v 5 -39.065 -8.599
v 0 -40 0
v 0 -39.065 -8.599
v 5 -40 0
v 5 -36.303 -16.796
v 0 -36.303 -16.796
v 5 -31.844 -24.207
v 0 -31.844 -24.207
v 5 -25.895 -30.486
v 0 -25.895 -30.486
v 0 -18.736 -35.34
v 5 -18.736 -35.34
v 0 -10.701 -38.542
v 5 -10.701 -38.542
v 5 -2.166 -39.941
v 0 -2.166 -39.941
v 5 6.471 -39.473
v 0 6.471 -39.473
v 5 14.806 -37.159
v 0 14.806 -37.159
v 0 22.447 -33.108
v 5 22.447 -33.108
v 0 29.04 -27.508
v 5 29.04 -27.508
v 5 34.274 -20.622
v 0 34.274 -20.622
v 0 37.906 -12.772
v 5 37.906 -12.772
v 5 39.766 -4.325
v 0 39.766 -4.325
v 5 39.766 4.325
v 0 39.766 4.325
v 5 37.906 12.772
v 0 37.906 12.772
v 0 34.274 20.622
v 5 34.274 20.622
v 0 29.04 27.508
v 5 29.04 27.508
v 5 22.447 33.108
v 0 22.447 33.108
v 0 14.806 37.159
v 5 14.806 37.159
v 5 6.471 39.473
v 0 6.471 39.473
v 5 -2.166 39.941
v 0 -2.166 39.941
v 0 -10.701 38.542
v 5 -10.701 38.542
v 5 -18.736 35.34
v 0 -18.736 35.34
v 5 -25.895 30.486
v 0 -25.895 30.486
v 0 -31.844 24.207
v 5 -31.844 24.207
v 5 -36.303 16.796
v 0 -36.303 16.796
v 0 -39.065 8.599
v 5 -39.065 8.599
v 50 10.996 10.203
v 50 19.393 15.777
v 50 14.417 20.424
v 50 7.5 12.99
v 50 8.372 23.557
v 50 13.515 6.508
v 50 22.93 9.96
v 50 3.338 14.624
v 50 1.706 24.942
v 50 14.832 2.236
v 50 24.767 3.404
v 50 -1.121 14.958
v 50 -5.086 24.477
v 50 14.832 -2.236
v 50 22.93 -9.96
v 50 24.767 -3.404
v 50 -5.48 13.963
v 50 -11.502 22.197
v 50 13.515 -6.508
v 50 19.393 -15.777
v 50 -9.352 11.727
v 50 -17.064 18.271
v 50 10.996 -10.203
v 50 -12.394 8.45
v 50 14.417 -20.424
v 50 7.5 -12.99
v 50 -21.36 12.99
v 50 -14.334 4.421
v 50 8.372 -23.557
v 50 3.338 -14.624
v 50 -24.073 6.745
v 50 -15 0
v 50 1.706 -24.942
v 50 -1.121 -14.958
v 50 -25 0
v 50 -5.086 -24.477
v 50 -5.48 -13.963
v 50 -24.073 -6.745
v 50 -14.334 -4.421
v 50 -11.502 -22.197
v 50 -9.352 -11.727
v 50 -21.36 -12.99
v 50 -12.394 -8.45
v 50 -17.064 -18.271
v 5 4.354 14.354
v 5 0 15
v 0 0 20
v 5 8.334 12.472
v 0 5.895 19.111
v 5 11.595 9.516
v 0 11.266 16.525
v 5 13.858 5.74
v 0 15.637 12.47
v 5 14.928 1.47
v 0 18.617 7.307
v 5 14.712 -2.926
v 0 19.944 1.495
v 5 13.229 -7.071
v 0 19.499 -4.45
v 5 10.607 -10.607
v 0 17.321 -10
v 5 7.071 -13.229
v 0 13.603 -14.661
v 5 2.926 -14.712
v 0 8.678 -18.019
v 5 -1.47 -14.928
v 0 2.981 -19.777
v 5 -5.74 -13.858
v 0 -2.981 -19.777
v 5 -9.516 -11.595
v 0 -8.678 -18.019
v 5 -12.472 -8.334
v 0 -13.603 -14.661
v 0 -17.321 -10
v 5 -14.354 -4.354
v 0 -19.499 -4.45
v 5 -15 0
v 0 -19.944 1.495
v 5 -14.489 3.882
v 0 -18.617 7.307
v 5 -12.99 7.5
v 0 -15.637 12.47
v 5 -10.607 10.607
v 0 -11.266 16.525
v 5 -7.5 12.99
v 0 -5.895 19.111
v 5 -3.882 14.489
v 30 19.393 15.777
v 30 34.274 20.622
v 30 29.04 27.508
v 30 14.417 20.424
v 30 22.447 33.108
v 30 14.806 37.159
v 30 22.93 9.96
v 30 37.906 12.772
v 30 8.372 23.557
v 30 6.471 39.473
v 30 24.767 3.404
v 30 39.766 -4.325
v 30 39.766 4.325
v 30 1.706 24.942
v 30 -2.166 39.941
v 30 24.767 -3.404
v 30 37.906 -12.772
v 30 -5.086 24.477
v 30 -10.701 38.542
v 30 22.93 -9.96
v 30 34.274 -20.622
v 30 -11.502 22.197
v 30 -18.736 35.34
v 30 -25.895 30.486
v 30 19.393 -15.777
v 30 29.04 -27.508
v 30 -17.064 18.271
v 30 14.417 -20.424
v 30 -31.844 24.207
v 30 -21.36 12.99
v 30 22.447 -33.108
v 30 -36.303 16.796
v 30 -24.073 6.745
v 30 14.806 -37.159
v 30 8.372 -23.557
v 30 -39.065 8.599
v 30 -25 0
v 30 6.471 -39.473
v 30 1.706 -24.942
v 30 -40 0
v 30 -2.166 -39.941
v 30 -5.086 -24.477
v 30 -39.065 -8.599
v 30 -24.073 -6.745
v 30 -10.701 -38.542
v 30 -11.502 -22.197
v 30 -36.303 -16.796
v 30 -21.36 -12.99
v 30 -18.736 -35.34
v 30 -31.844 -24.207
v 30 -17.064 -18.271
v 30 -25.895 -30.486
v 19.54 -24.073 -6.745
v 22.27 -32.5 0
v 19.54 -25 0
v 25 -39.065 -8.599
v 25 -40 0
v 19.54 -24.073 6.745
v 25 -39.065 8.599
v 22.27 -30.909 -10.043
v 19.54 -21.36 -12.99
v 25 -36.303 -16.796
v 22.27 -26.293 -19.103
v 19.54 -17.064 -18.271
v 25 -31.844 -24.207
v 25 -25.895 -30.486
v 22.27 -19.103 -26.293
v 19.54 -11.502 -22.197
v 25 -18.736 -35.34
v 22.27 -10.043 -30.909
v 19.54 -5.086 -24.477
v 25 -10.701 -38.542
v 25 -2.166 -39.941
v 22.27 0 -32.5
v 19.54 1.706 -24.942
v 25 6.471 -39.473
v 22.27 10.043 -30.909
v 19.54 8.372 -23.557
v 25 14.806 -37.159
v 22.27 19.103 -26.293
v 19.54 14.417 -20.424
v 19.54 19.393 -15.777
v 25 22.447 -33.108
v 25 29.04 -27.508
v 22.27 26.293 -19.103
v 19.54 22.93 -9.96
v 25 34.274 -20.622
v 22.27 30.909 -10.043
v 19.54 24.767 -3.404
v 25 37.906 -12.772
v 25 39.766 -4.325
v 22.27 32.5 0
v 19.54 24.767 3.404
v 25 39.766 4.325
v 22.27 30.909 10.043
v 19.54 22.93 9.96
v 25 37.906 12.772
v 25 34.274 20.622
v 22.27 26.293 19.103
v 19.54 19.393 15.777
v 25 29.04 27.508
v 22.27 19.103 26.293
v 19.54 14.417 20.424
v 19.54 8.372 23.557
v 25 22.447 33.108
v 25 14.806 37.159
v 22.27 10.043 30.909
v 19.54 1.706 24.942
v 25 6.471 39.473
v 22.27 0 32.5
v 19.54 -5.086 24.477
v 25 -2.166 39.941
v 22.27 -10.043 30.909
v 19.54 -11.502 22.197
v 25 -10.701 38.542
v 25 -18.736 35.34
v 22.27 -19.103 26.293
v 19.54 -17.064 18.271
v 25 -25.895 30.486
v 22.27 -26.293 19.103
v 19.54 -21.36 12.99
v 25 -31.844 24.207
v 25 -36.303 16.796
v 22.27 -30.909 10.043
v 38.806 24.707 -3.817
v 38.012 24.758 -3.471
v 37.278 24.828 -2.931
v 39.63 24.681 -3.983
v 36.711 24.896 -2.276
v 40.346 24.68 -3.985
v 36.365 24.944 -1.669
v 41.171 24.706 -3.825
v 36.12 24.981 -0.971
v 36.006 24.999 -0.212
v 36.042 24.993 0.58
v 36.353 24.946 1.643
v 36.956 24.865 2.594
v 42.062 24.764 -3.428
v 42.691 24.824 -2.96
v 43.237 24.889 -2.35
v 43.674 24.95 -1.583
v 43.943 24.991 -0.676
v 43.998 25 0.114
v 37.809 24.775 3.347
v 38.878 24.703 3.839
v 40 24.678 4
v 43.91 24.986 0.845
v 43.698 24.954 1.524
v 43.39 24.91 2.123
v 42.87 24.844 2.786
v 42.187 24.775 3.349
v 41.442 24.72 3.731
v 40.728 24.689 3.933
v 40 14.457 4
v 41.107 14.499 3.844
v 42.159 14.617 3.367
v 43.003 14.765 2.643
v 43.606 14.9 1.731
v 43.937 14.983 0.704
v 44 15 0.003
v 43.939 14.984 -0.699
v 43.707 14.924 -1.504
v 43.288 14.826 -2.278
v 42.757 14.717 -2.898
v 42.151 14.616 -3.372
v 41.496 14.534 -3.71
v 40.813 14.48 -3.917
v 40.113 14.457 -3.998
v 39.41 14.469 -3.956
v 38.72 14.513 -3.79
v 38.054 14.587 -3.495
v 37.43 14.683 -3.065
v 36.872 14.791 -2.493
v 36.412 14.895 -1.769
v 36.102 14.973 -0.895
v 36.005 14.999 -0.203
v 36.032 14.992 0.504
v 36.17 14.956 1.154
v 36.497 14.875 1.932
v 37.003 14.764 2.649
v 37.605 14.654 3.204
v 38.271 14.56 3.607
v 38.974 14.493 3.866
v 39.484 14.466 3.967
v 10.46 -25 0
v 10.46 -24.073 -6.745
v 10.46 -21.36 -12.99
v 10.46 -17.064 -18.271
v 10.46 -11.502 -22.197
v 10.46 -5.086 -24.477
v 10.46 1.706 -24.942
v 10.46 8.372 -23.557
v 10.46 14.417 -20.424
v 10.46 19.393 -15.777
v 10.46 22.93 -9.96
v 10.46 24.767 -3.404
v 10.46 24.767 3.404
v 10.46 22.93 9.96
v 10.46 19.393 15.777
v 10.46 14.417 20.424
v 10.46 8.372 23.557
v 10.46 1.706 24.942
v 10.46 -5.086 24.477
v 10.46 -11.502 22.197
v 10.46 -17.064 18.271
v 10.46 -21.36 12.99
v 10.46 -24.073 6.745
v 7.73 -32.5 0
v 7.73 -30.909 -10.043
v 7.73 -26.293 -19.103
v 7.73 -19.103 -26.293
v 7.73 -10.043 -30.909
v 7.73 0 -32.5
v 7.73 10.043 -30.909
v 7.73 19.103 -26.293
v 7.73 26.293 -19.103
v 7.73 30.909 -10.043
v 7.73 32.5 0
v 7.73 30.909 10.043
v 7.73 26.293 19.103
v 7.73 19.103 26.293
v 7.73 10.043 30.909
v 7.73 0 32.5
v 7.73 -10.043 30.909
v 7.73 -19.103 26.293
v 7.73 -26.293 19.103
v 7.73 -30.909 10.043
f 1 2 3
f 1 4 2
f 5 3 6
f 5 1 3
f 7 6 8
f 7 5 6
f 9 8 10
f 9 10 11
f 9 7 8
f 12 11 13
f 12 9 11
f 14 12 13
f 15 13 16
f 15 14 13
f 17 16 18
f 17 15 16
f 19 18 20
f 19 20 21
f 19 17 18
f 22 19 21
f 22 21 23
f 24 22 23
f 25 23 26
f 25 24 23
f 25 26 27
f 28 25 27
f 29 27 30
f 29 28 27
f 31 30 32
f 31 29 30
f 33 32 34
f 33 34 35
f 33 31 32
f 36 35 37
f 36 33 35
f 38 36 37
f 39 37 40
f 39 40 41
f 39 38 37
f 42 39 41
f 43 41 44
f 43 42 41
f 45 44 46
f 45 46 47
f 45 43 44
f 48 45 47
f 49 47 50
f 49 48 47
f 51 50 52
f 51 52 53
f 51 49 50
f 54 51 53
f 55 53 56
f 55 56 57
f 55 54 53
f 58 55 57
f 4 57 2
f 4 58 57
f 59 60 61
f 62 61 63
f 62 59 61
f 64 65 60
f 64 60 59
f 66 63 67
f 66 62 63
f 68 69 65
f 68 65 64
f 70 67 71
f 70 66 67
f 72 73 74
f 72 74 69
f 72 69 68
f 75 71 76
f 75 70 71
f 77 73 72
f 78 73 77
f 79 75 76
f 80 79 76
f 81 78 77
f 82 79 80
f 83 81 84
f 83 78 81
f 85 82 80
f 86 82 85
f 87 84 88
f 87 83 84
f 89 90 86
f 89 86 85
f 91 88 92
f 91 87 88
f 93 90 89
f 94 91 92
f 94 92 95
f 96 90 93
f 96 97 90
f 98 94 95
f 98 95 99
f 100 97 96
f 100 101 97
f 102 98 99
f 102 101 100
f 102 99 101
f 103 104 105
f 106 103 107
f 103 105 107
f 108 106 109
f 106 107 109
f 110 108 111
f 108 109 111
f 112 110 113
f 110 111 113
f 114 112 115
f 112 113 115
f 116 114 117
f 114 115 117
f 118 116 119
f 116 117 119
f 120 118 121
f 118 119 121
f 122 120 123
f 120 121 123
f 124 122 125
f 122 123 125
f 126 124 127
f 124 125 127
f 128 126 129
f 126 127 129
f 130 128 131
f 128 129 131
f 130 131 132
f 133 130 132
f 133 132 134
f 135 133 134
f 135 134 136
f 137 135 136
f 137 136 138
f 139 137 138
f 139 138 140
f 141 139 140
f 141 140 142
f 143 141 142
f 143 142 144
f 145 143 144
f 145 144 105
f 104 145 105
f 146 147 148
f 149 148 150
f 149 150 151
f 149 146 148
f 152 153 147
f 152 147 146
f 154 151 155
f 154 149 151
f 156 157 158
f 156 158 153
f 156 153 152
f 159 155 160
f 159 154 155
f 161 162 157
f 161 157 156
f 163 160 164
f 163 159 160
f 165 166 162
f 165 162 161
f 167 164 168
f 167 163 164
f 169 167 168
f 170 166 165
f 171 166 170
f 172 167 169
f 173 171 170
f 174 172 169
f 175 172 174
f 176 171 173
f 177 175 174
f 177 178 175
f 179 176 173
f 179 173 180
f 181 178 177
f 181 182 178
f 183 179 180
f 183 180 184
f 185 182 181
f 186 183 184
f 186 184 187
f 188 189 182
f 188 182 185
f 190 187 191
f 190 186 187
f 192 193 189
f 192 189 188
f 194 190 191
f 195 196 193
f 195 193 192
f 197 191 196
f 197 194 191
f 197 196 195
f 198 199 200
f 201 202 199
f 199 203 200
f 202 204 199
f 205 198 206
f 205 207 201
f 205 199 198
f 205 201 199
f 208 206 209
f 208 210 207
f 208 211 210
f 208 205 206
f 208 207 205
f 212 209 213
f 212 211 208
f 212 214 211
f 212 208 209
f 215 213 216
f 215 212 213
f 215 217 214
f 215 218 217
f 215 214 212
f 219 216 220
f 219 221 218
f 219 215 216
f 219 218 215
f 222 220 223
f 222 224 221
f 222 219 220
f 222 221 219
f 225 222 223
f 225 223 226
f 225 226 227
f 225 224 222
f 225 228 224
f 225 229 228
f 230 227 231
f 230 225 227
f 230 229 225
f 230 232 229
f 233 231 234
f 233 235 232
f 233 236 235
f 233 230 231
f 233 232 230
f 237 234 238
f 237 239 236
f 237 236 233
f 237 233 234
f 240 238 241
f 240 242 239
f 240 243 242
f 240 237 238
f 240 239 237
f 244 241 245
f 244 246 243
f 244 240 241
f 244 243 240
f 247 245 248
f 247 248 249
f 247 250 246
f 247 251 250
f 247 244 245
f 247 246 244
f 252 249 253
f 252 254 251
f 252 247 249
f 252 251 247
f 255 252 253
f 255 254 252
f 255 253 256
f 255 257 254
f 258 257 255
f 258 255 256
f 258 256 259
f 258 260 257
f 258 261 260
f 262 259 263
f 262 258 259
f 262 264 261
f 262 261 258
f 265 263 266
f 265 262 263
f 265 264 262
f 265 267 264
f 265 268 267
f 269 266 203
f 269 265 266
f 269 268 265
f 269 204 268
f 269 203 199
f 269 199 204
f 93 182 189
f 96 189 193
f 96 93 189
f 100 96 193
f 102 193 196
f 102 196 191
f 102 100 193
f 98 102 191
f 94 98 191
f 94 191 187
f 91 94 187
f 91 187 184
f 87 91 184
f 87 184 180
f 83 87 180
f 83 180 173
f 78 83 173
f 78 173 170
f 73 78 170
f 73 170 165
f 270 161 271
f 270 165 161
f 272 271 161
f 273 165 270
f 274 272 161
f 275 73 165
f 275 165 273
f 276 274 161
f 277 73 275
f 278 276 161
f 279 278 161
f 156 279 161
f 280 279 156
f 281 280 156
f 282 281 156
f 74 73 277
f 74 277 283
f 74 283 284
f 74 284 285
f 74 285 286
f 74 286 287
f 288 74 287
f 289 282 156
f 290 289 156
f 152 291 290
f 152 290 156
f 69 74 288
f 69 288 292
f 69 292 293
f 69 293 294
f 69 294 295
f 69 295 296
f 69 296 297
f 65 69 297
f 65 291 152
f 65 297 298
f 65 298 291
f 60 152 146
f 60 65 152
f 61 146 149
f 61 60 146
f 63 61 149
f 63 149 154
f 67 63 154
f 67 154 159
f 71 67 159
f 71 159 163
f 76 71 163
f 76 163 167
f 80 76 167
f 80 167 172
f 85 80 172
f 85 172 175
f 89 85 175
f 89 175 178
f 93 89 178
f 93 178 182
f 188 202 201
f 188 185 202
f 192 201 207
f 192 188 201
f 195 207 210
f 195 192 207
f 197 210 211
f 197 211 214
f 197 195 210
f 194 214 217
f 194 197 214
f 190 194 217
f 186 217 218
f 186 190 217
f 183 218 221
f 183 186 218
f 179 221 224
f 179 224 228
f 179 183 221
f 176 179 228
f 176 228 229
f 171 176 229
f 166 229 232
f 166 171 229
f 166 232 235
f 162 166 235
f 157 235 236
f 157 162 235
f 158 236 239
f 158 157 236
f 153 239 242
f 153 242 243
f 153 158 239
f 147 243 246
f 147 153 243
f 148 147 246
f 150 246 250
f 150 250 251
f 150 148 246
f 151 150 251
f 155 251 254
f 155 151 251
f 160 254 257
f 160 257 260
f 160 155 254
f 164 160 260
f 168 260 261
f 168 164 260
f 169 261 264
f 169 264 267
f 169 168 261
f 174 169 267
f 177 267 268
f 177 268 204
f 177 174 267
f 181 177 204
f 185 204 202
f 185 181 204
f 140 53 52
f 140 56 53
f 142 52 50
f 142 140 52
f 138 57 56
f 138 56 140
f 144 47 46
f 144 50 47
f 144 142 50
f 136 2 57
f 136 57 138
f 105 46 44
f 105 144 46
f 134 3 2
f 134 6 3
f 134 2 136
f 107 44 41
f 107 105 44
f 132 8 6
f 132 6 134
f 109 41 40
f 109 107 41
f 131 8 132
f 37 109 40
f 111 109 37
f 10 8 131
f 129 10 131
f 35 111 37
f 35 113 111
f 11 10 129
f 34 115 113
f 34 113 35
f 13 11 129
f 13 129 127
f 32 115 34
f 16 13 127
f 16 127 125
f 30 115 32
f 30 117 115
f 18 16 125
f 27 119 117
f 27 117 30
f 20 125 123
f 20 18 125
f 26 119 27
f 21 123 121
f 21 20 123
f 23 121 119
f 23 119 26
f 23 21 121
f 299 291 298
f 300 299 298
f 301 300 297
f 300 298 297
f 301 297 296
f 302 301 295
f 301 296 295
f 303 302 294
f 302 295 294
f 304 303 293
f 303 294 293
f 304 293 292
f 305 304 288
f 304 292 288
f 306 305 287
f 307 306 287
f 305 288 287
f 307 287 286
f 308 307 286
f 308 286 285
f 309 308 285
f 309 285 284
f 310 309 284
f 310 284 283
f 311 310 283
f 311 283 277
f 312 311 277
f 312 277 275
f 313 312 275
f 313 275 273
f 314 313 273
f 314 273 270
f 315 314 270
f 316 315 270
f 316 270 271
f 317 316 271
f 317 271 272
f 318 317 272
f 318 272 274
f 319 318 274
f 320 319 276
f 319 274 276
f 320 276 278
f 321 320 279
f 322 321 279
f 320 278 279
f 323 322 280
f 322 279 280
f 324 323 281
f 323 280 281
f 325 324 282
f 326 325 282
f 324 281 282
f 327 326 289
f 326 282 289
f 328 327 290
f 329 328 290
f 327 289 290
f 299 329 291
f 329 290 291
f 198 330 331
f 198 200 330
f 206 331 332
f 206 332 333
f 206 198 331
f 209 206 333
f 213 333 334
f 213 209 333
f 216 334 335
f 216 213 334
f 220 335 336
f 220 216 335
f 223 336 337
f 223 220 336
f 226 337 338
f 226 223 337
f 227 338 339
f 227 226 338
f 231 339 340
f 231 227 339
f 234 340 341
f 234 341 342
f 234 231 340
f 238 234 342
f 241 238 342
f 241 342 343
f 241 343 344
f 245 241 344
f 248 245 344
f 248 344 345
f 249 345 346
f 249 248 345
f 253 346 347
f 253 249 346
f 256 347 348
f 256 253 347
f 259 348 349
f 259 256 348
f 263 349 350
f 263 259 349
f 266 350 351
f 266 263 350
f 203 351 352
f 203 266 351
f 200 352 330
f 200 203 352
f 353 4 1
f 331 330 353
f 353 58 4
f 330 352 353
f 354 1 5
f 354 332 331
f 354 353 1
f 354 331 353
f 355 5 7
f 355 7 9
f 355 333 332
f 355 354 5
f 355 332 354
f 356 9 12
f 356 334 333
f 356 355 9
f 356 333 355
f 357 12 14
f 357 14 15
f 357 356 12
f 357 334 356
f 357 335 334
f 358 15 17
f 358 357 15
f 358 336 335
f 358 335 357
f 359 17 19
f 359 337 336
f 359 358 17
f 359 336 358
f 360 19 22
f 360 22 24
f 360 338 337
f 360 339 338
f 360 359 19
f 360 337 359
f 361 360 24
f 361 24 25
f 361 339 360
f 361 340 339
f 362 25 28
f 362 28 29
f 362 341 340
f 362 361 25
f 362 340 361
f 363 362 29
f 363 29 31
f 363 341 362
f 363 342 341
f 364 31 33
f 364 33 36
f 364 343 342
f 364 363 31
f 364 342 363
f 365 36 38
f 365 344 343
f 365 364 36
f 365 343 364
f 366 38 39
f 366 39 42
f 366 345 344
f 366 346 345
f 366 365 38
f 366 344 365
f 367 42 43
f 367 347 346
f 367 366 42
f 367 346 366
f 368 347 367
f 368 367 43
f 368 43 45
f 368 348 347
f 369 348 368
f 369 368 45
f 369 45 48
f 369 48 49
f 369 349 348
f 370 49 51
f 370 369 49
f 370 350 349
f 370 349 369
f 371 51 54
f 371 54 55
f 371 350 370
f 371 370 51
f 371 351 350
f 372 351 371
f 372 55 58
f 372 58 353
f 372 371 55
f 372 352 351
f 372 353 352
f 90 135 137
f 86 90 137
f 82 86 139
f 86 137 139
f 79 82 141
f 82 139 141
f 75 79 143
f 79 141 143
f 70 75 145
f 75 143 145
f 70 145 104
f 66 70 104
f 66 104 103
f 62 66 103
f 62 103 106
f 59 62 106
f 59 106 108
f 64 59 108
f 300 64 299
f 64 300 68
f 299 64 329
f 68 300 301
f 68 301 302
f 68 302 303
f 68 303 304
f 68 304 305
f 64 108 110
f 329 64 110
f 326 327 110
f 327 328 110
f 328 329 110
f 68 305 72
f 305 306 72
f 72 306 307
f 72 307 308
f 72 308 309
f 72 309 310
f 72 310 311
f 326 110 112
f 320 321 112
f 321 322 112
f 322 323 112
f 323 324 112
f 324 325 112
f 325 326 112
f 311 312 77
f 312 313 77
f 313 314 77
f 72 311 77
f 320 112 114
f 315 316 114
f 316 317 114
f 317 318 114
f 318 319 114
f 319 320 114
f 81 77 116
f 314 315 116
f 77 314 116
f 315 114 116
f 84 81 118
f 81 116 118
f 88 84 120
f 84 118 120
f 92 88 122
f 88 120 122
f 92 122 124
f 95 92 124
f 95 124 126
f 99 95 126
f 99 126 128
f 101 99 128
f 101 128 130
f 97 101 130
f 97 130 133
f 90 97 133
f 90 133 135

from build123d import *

# Parameters (mm, degrees)
SKETCH2_R               = 12.5
CUT_EXTRUDE1_DEPTH      = 65.031242374
BOSS_EXTRUDE1_START     = 20
SKETCH3_R               = 25
BOSS_EXTRUDE1_DEPTH     = 20
SKETCH2_2_R             = 12.5
CUT_EXTRUDE2_DEPTH      = 76.498344353
SKETCH5_R               = 20
CUT_EXTRUDE3_DEPTH      = 5
CUT_EXTRUDE3_DRAFT      = -45
SKETCH6_R               = 15
CUT_EXTRUDE4_DEPTH      = 73.284161474
CUT_EXTRUDE5_REACH      = 93.241
CUT_EXTRUDE5_END_RADIUS = 15
SKETCH10_R              = 4


with BuildPart() as part:
    # Sketch1 → Revolve1 (revolve)
    with BuildSketch(Plane.XY, mode=Mode.PRIVATE) as revolve1_sk:
        Polygon((0, 0), (0, 40), (5, 40), (10.459553514, 25), (19.540446486, 25), (25, 40), (30, 40), (30, 0), align=None)
    revolve(revolve1_sk.sketch.rotate(Axis((0, 0, 0), (1, 0, 0)), 180), axis=Axis((0, 0, 0), (1, 0, 0)))

    # Sketch2 → Cut-Extrude1 (cut, through all)
    with BuildSketch(Plane.ZY):
        with Locations(Location((0, 0, 0), (0, 0, 270))):
            Circle(SKETCH2_R)
    extrude(amount=-CUT_EXTRUDE1_DEPTH, mode=Mode.SUBTRACT)

    # Sketch3 → Boss-Extrude1 (add)
    with BuildSketch(Plane(origin=(30, 0, 0), x_dir=(0, 0, -1), z_dir=(1, 0, 0)).offset(BOSS_EXTRUDE1_START)):
        with Locations(Location((0, 0, 0), (0, 0, 270))):
            Circle(SKETCH3_R)
    extrude(amount=-BOSS_EXTRUDE1_DEPTH)

    # Sketch2<2> → Cut-Extrude2 (cut, through all)
    with BuildSketch(Plane.ZY):
        with Locations(Location((0, 0, 0), (0, 0, 270))):
            Circle(SKETCH2_2_R)
    extrude(amount=-CUT_EXTRUDE2_DEPTH, mode=Mode.SUBTRACT)


with BuildPart() as cut_extrude3_tool:
    # Sketch5 → Cut-Extrude3 (with draft: the straight prism first)
    with BuildSketch(Plane.ZY):
        Circle(SKETCH5_R)
    extrude(amount=-CUT_EXTRUDE3_DEPTH)
    # Cut-Extrude3: the draft: its side faces are tilted about the plane it starts from
    cut_extrude3_sides = [cut_extrude3_tool.faces().sort_by_distance(p)[0] for p in [
        (2.5, 0, -20),
    ]]
    draft(cut_extrude3_sides, Plane.ZY, CUT_EXTRUDE3_DRAFT)


with BuildPart() as part_1:
    add(part.part)

    # Cut-Extrude3: cut by cut_extrude3_tool
    add(cut_extrude3_tool.part, mode=Mode.SUBTRACT)

    # Sketch6 → Cut-Extrude4 (cut, through all)
    with BuildSketch(Plane.ZY.offset(-5)):
        with Locations(Location((0, 0, 0), (0, 0, 270))):
            Circle(SKETCH6_R)
    extrude(amount=-CUT_EXTRUDE4_DEPTH, mode=Mode.SUBTRACT)

    # Cut-Extrude5: up to this cylinder (the profile starts outside it)
    cut_extrude5_end = Plane(origin=(40, 0, 0), z_dir=(-1, 0, 0)) * Cylinder(CUT_EXTRUDE5_END_RADIUS, 217.482, mode=Mode.PRIVATE)
    # Sketch10 → Cut-Extrude5 (cut, up to the surface)
    with BuildSketch(Plane(origin=(0, 25, 0), x_dir=(1, 0, 0), z_dir=(0, 1, 0)), mode=Mode.PRIVATE) as cut_extrude5_sk1:
        with Locations(Location((40, 0, 0), (0, 0, 270))):
            Circle(SKETCH10_R)
    cut_extrude5_tool1 = extrude(cut_extrude5_sk1.sketch, amount=-CUT_EXTRUDE5_REACH, mode=Mode.PRIVATE) - cut_extrude5_end
    add(cut_extrude5_tool1.solids().sort_by_distance((40, 25, 0))[0], mode=Mode.SUBTRACT)


solid = part_1.part
